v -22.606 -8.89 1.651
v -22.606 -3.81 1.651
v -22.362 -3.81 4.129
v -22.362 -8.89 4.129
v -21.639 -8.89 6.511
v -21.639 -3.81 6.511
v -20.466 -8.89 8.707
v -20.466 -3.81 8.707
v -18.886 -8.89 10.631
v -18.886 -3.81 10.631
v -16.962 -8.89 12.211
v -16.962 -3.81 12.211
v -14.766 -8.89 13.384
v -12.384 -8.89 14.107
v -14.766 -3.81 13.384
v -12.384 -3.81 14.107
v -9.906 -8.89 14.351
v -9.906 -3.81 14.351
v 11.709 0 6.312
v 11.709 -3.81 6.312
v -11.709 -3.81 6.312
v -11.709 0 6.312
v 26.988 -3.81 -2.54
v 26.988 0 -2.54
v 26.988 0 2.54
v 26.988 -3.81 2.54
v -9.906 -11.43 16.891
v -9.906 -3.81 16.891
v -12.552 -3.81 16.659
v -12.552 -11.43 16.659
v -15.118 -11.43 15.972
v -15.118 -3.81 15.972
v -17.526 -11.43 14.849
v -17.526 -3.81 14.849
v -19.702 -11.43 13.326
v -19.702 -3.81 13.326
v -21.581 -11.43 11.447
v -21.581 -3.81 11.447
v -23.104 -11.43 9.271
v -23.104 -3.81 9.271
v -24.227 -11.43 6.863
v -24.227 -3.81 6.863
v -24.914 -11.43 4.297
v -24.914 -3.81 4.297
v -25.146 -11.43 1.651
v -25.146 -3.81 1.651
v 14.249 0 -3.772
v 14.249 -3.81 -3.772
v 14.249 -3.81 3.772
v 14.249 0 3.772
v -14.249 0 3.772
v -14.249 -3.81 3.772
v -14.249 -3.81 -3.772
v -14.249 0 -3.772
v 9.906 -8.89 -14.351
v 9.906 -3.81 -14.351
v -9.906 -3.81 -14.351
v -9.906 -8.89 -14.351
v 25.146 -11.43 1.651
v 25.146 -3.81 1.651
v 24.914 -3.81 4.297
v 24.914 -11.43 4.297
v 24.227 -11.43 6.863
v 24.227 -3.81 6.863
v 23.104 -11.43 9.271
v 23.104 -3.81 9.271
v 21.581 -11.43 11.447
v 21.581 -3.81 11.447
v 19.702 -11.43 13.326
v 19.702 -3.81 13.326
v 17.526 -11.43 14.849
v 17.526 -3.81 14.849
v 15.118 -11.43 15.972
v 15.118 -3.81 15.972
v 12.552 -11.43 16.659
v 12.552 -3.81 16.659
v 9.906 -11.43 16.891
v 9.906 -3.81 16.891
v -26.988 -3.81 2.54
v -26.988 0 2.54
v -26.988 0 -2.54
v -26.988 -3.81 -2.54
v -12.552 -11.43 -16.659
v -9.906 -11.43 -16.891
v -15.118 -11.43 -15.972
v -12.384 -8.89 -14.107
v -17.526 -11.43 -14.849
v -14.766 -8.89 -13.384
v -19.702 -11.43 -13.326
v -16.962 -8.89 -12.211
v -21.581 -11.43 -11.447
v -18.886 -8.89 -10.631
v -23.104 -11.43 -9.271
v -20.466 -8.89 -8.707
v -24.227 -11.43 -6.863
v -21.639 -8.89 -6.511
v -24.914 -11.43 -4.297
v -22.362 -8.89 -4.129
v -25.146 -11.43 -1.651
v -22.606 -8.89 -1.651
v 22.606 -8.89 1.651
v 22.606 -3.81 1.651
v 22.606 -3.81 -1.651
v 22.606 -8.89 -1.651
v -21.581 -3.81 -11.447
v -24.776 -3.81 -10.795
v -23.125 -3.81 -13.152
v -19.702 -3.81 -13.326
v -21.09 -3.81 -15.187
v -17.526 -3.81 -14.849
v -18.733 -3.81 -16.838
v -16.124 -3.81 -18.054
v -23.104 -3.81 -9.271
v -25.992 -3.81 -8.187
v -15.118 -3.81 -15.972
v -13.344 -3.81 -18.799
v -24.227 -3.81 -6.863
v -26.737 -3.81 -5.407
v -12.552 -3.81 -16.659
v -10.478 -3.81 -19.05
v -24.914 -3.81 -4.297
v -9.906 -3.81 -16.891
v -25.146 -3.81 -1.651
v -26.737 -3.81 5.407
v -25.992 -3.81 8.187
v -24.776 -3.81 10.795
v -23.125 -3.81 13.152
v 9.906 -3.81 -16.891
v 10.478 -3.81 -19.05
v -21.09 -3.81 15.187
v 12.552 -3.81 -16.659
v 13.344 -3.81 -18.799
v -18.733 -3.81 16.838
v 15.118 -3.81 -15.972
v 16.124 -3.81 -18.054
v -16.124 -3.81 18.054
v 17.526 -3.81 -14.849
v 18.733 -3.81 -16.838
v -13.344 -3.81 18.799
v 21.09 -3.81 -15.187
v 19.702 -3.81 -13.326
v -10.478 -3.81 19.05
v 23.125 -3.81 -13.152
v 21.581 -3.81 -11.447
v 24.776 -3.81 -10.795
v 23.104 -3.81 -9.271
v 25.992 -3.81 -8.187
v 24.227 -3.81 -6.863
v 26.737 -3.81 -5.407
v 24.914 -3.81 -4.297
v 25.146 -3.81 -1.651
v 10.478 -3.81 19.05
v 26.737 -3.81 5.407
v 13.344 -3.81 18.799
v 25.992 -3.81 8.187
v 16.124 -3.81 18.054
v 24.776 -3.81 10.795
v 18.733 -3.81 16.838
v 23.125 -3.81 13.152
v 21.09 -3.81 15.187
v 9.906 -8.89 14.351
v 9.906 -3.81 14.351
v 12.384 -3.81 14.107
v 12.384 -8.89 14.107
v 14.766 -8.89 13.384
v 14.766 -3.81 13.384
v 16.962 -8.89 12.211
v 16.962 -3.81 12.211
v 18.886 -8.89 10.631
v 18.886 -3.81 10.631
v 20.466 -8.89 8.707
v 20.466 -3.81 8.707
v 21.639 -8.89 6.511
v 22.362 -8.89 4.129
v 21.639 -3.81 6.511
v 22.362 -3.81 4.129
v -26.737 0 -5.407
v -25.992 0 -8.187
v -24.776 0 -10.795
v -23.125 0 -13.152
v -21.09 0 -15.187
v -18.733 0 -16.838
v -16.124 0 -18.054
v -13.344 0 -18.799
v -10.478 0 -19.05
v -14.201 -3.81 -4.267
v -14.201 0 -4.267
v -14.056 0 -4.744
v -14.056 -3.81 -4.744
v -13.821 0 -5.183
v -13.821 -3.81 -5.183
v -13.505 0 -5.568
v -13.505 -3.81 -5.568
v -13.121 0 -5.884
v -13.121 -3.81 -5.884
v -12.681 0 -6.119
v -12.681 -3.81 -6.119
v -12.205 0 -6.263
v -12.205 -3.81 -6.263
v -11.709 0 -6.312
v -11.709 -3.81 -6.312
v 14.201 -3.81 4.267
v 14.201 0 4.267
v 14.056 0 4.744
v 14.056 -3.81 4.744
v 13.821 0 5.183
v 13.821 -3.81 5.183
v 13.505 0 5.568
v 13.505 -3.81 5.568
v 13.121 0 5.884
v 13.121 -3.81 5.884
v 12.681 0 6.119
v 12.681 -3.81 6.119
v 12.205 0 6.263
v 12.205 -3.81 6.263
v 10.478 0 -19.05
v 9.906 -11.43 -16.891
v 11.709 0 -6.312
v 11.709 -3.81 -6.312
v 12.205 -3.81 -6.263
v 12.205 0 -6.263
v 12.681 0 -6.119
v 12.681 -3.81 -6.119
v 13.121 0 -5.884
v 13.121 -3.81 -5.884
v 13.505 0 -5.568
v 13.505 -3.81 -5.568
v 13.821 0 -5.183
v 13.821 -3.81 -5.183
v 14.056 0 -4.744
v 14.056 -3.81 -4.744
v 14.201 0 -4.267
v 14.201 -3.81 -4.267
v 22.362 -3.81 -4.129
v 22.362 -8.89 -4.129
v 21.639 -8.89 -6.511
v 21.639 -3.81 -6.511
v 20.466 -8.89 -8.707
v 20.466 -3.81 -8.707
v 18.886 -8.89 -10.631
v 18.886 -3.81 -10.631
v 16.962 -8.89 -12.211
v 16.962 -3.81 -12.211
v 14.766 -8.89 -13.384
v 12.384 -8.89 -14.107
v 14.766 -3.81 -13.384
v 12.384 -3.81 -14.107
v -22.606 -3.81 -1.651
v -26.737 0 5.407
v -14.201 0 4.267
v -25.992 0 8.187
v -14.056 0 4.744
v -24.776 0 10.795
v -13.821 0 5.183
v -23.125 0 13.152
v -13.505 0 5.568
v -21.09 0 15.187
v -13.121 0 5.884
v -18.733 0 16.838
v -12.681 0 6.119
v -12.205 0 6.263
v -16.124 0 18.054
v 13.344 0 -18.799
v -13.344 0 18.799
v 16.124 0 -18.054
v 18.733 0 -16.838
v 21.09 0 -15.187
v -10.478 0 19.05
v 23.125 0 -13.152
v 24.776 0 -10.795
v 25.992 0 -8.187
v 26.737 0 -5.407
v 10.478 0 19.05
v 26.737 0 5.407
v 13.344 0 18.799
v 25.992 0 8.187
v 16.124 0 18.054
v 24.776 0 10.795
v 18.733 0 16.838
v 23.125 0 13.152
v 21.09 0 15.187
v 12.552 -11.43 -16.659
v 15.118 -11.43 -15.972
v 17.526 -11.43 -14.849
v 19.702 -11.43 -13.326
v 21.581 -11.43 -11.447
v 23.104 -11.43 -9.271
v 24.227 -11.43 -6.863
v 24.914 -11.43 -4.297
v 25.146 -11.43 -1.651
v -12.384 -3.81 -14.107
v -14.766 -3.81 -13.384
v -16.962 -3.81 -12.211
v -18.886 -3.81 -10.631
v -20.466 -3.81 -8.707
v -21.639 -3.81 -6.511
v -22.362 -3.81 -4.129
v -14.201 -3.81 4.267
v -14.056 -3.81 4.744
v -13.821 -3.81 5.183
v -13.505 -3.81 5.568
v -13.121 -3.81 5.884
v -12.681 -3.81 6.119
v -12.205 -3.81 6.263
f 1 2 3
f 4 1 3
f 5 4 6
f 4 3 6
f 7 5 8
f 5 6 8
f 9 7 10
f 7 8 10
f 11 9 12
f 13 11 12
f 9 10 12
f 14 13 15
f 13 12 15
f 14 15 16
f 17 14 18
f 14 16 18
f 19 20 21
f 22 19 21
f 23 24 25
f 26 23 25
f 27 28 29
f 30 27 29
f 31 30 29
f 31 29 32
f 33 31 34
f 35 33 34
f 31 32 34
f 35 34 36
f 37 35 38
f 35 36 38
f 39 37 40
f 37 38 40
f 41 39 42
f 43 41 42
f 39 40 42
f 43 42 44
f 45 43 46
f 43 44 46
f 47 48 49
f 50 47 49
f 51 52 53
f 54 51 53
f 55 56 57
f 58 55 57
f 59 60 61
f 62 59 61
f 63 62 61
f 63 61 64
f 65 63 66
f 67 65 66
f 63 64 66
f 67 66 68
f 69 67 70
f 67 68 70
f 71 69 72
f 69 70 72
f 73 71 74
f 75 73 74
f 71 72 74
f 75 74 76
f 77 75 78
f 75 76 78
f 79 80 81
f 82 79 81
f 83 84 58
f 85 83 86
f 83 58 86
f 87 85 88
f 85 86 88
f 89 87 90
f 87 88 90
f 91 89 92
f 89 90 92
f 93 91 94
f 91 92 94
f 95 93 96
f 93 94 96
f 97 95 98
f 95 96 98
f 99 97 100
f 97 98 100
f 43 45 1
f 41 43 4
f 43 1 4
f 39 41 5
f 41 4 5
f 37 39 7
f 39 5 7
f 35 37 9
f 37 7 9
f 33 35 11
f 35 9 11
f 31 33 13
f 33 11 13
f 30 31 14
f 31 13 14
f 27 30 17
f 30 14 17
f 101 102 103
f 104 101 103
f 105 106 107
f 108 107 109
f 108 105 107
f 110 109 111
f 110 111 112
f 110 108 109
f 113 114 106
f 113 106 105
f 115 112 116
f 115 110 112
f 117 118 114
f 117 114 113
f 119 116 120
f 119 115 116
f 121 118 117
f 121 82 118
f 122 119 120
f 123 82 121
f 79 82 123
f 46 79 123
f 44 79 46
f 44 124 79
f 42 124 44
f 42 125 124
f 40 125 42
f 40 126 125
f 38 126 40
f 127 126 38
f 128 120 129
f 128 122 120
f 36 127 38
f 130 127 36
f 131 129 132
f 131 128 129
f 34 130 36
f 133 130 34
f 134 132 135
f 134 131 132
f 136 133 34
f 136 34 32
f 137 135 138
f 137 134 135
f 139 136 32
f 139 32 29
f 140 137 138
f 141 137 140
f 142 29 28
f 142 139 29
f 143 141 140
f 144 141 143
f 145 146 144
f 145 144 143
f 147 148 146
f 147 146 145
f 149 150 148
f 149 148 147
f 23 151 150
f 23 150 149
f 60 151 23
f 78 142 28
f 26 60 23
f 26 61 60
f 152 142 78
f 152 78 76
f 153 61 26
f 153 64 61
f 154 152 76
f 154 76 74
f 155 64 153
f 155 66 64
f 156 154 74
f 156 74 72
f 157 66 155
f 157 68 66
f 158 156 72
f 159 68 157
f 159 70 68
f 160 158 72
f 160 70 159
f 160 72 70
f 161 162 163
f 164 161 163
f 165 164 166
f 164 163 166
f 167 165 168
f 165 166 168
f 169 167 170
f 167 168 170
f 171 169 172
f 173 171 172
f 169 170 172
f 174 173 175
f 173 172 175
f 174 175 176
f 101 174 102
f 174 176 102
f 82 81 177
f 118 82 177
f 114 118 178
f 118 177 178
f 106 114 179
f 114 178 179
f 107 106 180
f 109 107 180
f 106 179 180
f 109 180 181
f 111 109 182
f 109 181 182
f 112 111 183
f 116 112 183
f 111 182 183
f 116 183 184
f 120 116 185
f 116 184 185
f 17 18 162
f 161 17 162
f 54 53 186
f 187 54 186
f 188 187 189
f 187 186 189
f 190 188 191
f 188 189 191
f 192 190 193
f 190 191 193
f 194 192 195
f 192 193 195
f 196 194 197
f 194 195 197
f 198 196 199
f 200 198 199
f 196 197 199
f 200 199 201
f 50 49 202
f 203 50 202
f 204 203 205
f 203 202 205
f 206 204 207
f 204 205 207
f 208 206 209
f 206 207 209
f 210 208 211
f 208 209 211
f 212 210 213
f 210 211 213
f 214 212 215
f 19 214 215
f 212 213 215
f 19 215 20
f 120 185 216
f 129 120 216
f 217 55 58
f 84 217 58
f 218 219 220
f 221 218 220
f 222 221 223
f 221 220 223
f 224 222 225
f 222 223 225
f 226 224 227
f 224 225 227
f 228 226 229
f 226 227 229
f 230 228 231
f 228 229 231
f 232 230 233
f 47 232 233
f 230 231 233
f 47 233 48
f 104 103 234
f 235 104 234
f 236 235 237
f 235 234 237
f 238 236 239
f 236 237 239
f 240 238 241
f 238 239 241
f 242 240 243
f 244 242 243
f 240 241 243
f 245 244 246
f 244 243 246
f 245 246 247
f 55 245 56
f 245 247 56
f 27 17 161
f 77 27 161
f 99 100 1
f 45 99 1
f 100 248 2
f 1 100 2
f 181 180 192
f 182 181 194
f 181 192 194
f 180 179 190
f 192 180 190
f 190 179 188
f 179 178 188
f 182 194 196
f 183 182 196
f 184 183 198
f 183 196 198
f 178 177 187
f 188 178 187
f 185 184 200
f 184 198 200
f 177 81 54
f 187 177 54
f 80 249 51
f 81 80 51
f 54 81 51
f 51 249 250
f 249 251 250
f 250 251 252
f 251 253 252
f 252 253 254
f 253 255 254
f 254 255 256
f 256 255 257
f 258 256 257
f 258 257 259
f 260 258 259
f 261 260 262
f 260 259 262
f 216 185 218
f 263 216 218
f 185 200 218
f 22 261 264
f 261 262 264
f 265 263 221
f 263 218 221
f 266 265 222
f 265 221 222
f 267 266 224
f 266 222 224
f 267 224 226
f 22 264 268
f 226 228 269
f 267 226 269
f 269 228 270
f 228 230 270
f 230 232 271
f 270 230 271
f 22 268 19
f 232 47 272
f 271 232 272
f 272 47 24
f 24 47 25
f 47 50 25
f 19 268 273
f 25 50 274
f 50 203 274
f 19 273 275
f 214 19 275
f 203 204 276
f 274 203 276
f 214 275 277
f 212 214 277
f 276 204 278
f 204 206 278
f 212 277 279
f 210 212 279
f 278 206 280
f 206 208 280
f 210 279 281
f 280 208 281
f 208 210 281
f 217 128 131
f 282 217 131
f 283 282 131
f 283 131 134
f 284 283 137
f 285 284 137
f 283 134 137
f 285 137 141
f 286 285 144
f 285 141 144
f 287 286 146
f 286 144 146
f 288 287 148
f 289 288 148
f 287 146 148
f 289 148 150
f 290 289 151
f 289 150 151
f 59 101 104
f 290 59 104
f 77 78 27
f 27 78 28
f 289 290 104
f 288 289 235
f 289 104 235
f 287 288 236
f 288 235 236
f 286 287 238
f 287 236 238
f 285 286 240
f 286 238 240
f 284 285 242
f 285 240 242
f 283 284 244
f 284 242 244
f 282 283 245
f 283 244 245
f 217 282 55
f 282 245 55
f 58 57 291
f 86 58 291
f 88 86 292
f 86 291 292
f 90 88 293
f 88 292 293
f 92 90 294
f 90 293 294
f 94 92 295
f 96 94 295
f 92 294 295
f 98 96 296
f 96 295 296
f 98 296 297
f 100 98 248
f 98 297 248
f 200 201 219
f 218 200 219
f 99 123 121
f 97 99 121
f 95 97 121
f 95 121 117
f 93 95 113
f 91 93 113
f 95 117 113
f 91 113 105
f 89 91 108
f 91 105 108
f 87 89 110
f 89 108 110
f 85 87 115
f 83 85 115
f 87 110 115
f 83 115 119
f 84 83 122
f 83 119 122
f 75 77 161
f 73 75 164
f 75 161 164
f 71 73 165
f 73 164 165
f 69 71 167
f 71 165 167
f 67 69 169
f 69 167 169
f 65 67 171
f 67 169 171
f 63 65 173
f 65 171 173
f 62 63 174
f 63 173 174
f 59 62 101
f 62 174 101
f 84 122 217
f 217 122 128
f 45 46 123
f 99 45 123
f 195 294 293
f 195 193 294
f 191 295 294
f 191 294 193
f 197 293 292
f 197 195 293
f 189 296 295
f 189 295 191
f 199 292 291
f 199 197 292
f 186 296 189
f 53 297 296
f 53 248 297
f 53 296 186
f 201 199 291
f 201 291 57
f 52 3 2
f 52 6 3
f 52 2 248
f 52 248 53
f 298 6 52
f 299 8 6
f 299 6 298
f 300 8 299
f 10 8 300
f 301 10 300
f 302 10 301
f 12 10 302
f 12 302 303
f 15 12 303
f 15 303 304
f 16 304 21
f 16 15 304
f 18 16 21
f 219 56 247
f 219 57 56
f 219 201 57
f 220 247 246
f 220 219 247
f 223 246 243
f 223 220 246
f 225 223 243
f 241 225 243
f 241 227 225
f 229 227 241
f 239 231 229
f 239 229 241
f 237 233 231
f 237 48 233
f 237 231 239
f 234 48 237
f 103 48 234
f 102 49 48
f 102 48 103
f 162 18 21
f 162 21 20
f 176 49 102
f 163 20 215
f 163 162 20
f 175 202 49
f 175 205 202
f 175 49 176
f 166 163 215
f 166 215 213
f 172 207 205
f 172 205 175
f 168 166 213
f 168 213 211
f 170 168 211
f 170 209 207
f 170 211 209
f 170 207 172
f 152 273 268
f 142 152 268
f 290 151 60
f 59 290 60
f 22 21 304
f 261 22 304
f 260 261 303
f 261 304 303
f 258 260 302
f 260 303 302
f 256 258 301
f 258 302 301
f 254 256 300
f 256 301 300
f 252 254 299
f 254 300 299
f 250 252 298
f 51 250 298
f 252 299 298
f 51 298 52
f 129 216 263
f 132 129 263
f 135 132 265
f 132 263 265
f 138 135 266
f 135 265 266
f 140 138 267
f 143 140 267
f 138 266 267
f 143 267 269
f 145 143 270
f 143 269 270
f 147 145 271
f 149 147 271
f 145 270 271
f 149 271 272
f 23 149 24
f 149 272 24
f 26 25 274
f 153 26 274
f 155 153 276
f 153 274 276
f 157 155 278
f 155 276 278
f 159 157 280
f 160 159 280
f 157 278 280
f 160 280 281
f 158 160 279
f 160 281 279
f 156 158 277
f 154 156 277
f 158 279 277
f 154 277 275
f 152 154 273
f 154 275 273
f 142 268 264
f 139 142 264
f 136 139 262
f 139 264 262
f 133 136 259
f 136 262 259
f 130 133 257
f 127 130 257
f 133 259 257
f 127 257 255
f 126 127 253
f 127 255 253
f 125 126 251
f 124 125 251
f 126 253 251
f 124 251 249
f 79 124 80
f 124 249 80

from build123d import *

# Parameters (mm, degrees)
F1_DEPTH = 3.81
F3_DEPTH = 7.62
F5_DEPTH = 3.811
F6_SIZE  = 2.53999


# Not quite as in the source:
# - a fillet or chamfer is up to 0.001 mm smaller than in the source, because OpenCascade refuses the exact size


with BuildPart() as f1:
    # F0 (on Front) → F1 (new body)
    with BuildSketch(Plane.XZ):
        with BuildLine():
            ThreePointArc((-26.9875, -2.54), (-22.1518329574, -14.2143329574), (-10.4775, -19.05))
            Line((-10.4775, -19.05), (10.4775, -19.05))
            ThreePointArc((10.4775, -19.05), (22.1518329574, -14.2143329574), (26.9875, -2.54))
            Line((26.9875, -2.54), (26.9875, 2.54))
            ThreePointArc((26.9875, 2.54), (22.1518329574, 14.2143329574), (10.4775, 19.05))
            Line((10.4775, 19.05), (-10.4775, 19.05))
            ThreePointArc((-10.4775, 19.05), (-22.1518329574, 14.2143329574), (-26.9875, 2.54))
            Line((-26.9875, 2.54), (-26.9875, -2.54))
        make_face()
    extrude(amount=F1_DEPTH)

    # F2 (on face) → F3 (join)
    with BuildSketch(Plane.XZ.offset(3.81)):
        with BuildLine():
            Line((9.906, 16.891), (-9.906, 16.891))
            ThreePointArc((-9.906, 16.891), (-20.6823073453, 12.4273073453), (-25.146, 1.651))
            Line((-25.146, 1.651), (-25.146, -1.651))
            ThreePointArc((-25.146, -1.651), (-20.6823073453, -12.4273073453), (-9.906, -16.891))
            Line((-9.906, -16.891), (9.906, -16.891))
            ThreePointArc((9.906, -16.891), (20.6823073453, -12.4273073453), (25.146, -1.651))
            Line((25.146, -1.651), (25.146, 1.651))
            ThreePointArc((25.146, 1.651), (20.6823073453, 12.4273073453), (9.906, 16.891))
        make_face()
        with BuildLine():
            Line((9.906, -14.351), (-9.906, -14.351))
            ThreePointArc((-9.906, -14.351), (-18.8862561211, -10.6312561211), (-22.606, -1.651))
            Line((-22.606, -1.651), (-22.606, 1.651))
            ThreePointArc((-22.606, 1.651), (-18.8862561211, 10.6312561211), (-9.906, 14.351))
            Line((-9.906, 14.351), (9.906, 14.351))
            ThreePointArc((9.906, 14.351), (18.8862561211, 10.6312561211), (22.606, 1.651))
            Line((22.606, 1.651), (22.606, -1.651))
            ThreePointArc((22.606, -1.651), (18.8862561211, -10.6312561211), (9.906, -14.351))
        make_face(mode=Mode.SUBTRACT)
    extrude(amount=F3_DEPTH)

    # F4 (on face) → F5 (cut, through all)
    with BuildSketch(Plane.XZ.offset(3.81)):
        with BuildLine():
            ThreePointArc((-14.2494, -3.7719), (-13.5054512242, -5.5679512242), (-11.7094, -6.3119))
            Line((-11.7094, -6.3119), (11.7094, -6.3119))
            ThreePointArc((11.7094, -6.3119), (13.5054512242, -5.5679512242), (14.2494, -3.7719))
            Line((14.2494, -3.7719), (14.2494, 3.7719))
            ThreePointArc((14.2494, 3.7719), (13.5054512242, 5.5679512242), (11.7094, 6.3119))
            Line((11.7094, 6.3119), (-11.7094, 6.3119))
            ThreePointArc((-11.7094, 6.3119), (-13.5054512242, 5.5679512242), (-14.2494, 3.7719))
            Line((-14.2494, 3.7719), (-14.2494, -3.7719))
        make_face()
    extrude(amount=-F5_DEPTH, mode=Mode.SUBTRACT)

    # F6 (size 2.54 in the source; OpenCascade refuses exactly that, so slightly less here)
    f6_edges = [f1.edges().sort_by_distance(p)[0] for p in [
        (-18.886256, -11.43, 10.631256),
        (0, -11.43, 14.351),
        (18.886256, -11.43, 10.631256),
        (18.886256, -11.43, -10.631256),
        (-18.886256, -11.43, -10.631256),
        (0, -11.43, -14.351),
        (22.606, -11.43, 0),
        (-22.606, -11.43, 0),
    ]]
    chamfer(f6_edges, length=F6_SIZE)


solid = f1.part
